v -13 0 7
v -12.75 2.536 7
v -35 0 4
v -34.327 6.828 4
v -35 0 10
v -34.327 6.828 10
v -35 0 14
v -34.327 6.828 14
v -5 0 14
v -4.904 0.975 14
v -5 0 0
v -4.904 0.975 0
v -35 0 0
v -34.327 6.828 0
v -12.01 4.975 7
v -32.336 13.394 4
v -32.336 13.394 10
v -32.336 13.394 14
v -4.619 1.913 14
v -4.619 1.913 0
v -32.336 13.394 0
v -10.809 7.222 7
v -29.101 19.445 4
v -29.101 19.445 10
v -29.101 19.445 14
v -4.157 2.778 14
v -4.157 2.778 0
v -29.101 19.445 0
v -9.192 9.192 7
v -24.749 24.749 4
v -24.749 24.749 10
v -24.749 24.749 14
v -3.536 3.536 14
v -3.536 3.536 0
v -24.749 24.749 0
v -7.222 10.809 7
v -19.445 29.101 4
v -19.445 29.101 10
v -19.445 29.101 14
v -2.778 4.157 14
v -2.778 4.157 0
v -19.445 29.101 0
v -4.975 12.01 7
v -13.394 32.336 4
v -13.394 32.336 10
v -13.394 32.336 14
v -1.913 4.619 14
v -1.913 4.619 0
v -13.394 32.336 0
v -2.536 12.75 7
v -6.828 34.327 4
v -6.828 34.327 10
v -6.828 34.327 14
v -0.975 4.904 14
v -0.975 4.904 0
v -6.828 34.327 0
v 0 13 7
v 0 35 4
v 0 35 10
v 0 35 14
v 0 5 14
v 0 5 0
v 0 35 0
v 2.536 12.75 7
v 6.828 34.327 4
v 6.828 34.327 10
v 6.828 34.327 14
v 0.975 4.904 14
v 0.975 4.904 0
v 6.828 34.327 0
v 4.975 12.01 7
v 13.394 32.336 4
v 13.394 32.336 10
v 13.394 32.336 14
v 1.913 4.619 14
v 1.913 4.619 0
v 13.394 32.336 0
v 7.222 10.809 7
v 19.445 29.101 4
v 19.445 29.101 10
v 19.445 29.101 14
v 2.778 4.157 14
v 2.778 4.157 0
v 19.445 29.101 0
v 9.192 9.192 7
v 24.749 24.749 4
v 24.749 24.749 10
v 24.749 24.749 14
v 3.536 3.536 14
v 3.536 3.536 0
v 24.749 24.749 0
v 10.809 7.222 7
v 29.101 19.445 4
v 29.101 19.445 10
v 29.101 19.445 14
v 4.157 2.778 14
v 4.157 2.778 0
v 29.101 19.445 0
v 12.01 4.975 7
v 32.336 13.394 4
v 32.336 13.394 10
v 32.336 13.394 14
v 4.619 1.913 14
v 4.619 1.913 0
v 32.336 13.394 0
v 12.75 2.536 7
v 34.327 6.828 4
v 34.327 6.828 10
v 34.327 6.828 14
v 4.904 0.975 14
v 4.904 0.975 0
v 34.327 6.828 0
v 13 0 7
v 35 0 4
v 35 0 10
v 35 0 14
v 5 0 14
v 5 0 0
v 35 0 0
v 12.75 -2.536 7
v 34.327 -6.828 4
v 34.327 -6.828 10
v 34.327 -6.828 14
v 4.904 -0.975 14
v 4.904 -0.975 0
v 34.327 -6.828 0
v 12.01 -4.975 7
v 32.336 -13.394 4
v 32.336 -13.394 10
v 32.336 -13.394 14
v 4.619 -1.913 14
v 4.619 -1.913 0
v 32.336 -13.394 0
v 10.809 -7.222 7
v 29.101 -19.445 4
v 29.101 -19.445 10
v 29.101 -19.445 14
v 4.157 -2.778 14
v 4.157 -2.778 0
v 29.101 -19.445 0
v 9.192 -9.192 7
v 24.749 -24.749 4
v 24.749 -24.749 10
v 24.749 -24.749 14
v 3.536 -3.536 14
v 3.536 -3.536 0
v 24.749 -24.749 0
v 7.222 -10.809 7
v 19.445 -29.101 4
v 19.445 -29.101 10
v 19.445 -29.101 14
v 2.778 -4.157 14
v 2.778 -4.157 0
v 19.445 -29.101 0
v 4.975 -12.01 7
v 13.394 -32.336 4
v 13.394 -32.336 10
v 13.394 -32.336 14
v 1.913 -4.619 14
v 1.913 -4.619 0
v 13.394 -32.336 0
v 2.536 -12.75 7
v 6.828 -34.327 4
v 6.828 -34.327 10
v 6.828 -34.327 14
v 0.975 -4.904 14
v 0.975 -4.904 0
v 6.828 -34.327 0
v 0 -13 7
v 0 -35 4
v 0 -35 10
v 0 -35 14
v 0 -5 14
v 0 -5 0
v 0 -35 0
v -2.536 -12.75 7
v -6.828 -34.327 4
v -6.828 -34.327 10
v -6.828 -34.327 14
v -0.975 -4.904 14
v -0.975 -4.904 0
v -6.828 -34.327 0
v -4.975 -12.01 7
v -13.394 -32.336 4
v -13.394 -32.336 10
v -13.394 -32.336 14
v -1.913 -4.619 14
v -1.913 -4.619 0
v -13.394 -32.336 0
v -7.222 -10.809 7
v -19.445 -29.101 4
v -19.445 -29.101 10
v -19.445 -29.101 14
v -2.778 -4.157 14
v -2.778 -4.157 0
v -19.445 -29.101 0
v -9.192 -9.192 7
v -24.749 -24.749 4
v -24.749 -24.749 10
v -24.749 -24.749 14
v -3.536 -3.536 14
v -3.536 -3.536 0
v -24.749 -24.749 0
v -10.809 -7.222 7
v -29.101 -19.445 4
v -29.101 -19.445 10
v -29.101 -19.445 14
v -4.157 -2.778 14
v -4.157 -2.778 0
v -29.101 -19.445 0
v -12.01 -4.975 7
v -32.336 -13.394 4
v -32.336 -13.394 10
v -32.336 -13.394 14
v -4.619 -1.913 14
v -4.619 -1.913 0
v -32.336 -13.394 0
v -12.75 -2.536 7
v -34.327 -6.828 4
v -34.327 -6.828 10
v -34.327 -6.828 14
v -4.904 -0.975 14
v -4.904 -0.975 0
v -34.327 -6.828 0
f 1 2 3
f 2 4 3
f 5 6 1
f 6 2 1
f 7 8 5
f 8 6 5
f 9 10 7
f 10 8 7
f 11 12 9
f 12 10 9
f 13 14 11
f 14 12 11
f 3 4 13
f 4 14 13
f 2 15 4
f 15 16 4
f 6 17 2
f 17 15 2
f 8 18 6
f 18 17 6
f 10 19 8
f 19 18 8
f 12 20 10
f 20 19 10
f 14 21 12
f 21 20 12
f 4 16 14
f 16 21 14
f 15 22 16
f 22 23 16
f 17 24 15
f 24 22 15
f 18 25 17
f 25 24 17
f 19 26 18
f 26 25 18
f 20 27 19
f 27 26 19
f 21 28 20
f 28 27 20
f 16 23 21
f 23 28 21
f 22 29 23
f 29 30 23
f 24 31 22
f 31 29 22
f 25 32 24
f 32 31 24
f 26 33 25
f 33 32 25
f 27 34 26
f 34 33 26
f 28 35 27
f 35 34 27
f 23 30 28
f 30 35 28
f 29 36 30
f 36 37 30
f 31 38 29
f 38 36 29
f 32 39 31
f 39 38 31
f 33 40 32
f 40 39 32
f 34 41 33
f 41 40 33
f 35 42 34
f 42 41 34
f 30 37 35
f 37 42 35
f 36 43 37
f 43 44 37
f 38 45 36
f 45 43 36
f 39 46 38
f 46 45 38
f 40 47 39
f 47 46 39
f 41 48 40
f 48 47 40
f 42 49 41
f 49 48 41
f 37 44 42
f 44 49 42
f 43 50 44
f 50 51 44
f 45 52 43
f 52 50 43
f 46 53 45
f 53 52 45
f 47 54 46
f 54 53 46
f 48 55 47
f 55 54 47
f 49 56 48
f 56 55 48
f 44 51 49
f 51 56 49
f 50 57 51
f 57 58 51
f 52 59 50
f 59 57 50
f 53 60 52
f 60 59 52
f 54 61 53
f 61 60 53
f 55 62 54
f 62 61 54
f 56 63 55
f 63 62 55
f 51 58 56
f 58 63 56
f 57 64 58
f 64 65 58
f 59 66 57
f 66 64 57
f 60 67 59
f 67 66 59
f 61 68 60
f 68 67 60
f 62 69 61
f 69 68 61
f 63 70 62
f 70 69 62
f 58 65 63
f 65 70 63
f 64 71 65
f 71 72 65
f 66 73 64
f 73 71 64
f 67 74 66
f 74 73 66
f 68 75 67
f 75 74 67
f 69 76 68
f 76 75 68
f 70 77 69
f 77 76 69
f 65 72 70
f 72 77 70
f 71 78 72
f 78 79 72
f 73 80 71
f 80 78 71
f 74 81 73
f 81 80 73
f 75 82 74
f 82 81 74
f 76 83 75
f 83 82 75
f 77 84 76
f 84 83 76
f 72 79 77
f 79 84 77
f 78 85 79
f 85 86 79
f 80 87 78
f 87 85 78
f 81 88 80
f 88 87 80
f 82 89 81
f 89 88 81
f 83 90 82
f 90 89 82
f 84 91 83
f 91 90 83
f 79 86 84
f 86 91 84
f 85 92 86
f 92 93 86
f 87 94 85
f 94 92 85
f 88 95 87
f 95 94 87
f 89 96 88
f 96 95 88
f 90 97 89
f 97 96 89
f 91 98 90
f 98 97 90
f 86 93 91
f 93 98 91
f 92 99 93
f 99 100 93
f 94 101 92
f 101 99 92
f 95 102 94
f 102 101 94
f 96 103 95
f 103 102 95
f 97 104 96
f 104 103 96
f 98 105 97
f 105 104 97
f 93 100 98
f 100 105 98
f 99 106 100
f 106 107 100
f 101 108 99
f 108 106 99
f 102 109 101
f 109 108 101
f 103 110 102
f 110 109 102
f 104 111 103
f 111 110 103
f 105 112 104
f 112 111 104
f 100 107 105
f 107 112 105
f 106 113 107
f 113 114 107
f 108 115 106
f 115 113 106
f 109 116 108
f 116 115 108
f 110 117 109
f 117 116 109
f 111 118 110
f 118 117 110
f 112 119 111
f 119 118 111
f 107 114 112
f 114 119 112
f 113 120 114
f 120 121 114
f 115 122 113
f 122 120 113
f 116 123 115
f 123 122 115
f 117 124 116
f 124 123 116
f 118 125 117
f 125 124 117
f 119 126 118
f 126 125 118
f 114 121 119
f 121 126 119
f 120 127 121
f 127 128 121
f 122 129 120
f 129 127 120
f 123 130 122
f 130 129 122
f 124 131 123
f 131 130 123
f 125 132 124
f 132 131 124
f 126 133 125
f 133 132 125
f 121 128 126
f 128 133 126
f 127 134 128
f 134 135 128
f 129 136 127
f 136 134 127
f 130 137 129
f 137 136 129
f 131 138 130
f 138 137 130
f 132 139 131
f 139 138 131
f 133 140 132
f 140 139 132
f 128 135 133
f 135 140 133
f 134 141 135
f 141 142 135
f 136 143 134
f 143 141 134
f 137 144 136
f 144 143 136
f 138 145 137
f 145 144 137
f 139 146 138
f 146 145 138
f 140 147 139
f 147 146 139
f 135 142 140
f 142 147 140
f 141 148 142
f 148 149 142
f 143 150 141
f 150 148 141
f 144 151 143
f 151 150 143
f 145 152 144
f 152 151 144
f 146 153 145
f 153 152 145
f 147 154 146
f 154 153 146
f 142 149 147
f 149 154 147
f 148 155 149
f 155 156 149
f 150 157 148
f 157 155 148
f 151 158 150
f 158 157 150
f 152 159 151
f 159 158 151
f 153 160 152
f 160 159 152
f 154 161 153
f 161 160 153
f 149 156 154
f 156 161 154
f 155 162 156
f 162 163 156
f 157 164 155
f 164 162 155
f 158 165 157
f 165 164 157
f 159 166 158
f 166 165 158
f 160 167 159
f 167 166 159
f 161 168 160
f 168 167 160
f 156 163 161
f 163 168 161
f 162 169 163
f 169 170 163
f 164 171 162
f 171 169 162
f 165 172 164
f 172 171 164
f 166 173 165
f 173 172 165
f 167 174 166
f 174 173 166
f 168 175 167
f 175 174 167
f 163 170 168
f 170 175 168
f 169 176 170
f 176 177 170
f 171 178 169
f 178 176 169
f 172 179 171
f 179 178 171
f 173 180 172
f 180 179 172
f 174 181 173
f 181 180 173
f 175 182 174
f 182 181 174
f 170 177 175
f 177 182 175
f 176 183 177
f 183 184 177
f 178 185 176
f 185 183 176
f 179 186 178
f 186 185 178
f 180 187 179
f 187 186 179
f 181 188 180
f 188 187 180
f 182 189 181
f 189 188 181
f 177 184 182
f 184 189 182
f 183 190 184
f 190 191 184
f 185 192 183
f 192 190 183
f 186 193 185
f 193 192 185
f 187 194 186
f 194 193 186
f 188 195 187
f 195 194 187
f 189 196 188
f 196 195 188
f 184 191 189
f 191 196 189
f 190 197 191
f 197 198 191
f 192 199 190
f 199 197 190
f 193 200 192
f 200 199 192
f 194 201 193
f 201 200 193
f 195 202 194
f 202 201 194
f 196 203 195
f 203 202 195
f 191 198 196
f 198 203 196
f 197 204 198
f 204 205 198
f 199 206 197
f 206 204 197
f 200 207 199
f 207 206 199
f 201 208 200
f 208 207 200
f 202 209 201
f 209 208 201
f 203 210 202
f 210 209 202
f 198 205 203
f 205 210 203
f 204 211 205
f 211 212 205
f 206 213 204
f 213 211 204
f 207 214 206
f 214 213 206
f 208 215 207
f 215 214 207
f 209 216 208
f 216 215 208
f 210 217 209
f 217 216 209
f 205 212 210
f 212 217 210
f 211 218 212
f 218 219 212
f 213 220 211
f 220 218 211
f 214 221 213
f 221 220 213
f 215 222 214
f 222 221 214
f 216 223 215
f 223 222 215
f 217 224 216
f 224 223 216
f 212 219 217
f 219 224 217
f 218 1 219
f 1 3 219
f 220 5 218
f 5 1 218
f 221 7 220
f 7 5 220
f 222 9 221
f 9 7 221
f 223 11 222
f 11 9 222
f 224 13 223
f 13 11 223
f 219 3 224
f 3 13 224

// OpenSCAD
$fn = 32;

// ----------------------------------------------------------------------
// Revolved part: V-groove pulley R35
// ----------------------------------------------------------------------

// --- parameters (mm) ---
bore_r = 5;               // bore radius
rim_r = 35;               // rim radius
rim_t = 14;               // rim width
groove_r = 13;            // groove root radius
groove_w = 3;             // groove half width
revolve_angle = 360;      // revolve sweep, degrees

bore_d = 2 * bore_r;
rim_d = 2 * rim_r;
groove_d = 2 * groove_r;

profile = [[5, 0], [35, 0], [35, 4], [13, 7], [35, 10], [35, 14], [5, 14]];  // primary outline, 7 points, counter clockwise

// --- the one profile operation ---
rotate_extrude(angle = revolve_angle) polygon(points = profile);
